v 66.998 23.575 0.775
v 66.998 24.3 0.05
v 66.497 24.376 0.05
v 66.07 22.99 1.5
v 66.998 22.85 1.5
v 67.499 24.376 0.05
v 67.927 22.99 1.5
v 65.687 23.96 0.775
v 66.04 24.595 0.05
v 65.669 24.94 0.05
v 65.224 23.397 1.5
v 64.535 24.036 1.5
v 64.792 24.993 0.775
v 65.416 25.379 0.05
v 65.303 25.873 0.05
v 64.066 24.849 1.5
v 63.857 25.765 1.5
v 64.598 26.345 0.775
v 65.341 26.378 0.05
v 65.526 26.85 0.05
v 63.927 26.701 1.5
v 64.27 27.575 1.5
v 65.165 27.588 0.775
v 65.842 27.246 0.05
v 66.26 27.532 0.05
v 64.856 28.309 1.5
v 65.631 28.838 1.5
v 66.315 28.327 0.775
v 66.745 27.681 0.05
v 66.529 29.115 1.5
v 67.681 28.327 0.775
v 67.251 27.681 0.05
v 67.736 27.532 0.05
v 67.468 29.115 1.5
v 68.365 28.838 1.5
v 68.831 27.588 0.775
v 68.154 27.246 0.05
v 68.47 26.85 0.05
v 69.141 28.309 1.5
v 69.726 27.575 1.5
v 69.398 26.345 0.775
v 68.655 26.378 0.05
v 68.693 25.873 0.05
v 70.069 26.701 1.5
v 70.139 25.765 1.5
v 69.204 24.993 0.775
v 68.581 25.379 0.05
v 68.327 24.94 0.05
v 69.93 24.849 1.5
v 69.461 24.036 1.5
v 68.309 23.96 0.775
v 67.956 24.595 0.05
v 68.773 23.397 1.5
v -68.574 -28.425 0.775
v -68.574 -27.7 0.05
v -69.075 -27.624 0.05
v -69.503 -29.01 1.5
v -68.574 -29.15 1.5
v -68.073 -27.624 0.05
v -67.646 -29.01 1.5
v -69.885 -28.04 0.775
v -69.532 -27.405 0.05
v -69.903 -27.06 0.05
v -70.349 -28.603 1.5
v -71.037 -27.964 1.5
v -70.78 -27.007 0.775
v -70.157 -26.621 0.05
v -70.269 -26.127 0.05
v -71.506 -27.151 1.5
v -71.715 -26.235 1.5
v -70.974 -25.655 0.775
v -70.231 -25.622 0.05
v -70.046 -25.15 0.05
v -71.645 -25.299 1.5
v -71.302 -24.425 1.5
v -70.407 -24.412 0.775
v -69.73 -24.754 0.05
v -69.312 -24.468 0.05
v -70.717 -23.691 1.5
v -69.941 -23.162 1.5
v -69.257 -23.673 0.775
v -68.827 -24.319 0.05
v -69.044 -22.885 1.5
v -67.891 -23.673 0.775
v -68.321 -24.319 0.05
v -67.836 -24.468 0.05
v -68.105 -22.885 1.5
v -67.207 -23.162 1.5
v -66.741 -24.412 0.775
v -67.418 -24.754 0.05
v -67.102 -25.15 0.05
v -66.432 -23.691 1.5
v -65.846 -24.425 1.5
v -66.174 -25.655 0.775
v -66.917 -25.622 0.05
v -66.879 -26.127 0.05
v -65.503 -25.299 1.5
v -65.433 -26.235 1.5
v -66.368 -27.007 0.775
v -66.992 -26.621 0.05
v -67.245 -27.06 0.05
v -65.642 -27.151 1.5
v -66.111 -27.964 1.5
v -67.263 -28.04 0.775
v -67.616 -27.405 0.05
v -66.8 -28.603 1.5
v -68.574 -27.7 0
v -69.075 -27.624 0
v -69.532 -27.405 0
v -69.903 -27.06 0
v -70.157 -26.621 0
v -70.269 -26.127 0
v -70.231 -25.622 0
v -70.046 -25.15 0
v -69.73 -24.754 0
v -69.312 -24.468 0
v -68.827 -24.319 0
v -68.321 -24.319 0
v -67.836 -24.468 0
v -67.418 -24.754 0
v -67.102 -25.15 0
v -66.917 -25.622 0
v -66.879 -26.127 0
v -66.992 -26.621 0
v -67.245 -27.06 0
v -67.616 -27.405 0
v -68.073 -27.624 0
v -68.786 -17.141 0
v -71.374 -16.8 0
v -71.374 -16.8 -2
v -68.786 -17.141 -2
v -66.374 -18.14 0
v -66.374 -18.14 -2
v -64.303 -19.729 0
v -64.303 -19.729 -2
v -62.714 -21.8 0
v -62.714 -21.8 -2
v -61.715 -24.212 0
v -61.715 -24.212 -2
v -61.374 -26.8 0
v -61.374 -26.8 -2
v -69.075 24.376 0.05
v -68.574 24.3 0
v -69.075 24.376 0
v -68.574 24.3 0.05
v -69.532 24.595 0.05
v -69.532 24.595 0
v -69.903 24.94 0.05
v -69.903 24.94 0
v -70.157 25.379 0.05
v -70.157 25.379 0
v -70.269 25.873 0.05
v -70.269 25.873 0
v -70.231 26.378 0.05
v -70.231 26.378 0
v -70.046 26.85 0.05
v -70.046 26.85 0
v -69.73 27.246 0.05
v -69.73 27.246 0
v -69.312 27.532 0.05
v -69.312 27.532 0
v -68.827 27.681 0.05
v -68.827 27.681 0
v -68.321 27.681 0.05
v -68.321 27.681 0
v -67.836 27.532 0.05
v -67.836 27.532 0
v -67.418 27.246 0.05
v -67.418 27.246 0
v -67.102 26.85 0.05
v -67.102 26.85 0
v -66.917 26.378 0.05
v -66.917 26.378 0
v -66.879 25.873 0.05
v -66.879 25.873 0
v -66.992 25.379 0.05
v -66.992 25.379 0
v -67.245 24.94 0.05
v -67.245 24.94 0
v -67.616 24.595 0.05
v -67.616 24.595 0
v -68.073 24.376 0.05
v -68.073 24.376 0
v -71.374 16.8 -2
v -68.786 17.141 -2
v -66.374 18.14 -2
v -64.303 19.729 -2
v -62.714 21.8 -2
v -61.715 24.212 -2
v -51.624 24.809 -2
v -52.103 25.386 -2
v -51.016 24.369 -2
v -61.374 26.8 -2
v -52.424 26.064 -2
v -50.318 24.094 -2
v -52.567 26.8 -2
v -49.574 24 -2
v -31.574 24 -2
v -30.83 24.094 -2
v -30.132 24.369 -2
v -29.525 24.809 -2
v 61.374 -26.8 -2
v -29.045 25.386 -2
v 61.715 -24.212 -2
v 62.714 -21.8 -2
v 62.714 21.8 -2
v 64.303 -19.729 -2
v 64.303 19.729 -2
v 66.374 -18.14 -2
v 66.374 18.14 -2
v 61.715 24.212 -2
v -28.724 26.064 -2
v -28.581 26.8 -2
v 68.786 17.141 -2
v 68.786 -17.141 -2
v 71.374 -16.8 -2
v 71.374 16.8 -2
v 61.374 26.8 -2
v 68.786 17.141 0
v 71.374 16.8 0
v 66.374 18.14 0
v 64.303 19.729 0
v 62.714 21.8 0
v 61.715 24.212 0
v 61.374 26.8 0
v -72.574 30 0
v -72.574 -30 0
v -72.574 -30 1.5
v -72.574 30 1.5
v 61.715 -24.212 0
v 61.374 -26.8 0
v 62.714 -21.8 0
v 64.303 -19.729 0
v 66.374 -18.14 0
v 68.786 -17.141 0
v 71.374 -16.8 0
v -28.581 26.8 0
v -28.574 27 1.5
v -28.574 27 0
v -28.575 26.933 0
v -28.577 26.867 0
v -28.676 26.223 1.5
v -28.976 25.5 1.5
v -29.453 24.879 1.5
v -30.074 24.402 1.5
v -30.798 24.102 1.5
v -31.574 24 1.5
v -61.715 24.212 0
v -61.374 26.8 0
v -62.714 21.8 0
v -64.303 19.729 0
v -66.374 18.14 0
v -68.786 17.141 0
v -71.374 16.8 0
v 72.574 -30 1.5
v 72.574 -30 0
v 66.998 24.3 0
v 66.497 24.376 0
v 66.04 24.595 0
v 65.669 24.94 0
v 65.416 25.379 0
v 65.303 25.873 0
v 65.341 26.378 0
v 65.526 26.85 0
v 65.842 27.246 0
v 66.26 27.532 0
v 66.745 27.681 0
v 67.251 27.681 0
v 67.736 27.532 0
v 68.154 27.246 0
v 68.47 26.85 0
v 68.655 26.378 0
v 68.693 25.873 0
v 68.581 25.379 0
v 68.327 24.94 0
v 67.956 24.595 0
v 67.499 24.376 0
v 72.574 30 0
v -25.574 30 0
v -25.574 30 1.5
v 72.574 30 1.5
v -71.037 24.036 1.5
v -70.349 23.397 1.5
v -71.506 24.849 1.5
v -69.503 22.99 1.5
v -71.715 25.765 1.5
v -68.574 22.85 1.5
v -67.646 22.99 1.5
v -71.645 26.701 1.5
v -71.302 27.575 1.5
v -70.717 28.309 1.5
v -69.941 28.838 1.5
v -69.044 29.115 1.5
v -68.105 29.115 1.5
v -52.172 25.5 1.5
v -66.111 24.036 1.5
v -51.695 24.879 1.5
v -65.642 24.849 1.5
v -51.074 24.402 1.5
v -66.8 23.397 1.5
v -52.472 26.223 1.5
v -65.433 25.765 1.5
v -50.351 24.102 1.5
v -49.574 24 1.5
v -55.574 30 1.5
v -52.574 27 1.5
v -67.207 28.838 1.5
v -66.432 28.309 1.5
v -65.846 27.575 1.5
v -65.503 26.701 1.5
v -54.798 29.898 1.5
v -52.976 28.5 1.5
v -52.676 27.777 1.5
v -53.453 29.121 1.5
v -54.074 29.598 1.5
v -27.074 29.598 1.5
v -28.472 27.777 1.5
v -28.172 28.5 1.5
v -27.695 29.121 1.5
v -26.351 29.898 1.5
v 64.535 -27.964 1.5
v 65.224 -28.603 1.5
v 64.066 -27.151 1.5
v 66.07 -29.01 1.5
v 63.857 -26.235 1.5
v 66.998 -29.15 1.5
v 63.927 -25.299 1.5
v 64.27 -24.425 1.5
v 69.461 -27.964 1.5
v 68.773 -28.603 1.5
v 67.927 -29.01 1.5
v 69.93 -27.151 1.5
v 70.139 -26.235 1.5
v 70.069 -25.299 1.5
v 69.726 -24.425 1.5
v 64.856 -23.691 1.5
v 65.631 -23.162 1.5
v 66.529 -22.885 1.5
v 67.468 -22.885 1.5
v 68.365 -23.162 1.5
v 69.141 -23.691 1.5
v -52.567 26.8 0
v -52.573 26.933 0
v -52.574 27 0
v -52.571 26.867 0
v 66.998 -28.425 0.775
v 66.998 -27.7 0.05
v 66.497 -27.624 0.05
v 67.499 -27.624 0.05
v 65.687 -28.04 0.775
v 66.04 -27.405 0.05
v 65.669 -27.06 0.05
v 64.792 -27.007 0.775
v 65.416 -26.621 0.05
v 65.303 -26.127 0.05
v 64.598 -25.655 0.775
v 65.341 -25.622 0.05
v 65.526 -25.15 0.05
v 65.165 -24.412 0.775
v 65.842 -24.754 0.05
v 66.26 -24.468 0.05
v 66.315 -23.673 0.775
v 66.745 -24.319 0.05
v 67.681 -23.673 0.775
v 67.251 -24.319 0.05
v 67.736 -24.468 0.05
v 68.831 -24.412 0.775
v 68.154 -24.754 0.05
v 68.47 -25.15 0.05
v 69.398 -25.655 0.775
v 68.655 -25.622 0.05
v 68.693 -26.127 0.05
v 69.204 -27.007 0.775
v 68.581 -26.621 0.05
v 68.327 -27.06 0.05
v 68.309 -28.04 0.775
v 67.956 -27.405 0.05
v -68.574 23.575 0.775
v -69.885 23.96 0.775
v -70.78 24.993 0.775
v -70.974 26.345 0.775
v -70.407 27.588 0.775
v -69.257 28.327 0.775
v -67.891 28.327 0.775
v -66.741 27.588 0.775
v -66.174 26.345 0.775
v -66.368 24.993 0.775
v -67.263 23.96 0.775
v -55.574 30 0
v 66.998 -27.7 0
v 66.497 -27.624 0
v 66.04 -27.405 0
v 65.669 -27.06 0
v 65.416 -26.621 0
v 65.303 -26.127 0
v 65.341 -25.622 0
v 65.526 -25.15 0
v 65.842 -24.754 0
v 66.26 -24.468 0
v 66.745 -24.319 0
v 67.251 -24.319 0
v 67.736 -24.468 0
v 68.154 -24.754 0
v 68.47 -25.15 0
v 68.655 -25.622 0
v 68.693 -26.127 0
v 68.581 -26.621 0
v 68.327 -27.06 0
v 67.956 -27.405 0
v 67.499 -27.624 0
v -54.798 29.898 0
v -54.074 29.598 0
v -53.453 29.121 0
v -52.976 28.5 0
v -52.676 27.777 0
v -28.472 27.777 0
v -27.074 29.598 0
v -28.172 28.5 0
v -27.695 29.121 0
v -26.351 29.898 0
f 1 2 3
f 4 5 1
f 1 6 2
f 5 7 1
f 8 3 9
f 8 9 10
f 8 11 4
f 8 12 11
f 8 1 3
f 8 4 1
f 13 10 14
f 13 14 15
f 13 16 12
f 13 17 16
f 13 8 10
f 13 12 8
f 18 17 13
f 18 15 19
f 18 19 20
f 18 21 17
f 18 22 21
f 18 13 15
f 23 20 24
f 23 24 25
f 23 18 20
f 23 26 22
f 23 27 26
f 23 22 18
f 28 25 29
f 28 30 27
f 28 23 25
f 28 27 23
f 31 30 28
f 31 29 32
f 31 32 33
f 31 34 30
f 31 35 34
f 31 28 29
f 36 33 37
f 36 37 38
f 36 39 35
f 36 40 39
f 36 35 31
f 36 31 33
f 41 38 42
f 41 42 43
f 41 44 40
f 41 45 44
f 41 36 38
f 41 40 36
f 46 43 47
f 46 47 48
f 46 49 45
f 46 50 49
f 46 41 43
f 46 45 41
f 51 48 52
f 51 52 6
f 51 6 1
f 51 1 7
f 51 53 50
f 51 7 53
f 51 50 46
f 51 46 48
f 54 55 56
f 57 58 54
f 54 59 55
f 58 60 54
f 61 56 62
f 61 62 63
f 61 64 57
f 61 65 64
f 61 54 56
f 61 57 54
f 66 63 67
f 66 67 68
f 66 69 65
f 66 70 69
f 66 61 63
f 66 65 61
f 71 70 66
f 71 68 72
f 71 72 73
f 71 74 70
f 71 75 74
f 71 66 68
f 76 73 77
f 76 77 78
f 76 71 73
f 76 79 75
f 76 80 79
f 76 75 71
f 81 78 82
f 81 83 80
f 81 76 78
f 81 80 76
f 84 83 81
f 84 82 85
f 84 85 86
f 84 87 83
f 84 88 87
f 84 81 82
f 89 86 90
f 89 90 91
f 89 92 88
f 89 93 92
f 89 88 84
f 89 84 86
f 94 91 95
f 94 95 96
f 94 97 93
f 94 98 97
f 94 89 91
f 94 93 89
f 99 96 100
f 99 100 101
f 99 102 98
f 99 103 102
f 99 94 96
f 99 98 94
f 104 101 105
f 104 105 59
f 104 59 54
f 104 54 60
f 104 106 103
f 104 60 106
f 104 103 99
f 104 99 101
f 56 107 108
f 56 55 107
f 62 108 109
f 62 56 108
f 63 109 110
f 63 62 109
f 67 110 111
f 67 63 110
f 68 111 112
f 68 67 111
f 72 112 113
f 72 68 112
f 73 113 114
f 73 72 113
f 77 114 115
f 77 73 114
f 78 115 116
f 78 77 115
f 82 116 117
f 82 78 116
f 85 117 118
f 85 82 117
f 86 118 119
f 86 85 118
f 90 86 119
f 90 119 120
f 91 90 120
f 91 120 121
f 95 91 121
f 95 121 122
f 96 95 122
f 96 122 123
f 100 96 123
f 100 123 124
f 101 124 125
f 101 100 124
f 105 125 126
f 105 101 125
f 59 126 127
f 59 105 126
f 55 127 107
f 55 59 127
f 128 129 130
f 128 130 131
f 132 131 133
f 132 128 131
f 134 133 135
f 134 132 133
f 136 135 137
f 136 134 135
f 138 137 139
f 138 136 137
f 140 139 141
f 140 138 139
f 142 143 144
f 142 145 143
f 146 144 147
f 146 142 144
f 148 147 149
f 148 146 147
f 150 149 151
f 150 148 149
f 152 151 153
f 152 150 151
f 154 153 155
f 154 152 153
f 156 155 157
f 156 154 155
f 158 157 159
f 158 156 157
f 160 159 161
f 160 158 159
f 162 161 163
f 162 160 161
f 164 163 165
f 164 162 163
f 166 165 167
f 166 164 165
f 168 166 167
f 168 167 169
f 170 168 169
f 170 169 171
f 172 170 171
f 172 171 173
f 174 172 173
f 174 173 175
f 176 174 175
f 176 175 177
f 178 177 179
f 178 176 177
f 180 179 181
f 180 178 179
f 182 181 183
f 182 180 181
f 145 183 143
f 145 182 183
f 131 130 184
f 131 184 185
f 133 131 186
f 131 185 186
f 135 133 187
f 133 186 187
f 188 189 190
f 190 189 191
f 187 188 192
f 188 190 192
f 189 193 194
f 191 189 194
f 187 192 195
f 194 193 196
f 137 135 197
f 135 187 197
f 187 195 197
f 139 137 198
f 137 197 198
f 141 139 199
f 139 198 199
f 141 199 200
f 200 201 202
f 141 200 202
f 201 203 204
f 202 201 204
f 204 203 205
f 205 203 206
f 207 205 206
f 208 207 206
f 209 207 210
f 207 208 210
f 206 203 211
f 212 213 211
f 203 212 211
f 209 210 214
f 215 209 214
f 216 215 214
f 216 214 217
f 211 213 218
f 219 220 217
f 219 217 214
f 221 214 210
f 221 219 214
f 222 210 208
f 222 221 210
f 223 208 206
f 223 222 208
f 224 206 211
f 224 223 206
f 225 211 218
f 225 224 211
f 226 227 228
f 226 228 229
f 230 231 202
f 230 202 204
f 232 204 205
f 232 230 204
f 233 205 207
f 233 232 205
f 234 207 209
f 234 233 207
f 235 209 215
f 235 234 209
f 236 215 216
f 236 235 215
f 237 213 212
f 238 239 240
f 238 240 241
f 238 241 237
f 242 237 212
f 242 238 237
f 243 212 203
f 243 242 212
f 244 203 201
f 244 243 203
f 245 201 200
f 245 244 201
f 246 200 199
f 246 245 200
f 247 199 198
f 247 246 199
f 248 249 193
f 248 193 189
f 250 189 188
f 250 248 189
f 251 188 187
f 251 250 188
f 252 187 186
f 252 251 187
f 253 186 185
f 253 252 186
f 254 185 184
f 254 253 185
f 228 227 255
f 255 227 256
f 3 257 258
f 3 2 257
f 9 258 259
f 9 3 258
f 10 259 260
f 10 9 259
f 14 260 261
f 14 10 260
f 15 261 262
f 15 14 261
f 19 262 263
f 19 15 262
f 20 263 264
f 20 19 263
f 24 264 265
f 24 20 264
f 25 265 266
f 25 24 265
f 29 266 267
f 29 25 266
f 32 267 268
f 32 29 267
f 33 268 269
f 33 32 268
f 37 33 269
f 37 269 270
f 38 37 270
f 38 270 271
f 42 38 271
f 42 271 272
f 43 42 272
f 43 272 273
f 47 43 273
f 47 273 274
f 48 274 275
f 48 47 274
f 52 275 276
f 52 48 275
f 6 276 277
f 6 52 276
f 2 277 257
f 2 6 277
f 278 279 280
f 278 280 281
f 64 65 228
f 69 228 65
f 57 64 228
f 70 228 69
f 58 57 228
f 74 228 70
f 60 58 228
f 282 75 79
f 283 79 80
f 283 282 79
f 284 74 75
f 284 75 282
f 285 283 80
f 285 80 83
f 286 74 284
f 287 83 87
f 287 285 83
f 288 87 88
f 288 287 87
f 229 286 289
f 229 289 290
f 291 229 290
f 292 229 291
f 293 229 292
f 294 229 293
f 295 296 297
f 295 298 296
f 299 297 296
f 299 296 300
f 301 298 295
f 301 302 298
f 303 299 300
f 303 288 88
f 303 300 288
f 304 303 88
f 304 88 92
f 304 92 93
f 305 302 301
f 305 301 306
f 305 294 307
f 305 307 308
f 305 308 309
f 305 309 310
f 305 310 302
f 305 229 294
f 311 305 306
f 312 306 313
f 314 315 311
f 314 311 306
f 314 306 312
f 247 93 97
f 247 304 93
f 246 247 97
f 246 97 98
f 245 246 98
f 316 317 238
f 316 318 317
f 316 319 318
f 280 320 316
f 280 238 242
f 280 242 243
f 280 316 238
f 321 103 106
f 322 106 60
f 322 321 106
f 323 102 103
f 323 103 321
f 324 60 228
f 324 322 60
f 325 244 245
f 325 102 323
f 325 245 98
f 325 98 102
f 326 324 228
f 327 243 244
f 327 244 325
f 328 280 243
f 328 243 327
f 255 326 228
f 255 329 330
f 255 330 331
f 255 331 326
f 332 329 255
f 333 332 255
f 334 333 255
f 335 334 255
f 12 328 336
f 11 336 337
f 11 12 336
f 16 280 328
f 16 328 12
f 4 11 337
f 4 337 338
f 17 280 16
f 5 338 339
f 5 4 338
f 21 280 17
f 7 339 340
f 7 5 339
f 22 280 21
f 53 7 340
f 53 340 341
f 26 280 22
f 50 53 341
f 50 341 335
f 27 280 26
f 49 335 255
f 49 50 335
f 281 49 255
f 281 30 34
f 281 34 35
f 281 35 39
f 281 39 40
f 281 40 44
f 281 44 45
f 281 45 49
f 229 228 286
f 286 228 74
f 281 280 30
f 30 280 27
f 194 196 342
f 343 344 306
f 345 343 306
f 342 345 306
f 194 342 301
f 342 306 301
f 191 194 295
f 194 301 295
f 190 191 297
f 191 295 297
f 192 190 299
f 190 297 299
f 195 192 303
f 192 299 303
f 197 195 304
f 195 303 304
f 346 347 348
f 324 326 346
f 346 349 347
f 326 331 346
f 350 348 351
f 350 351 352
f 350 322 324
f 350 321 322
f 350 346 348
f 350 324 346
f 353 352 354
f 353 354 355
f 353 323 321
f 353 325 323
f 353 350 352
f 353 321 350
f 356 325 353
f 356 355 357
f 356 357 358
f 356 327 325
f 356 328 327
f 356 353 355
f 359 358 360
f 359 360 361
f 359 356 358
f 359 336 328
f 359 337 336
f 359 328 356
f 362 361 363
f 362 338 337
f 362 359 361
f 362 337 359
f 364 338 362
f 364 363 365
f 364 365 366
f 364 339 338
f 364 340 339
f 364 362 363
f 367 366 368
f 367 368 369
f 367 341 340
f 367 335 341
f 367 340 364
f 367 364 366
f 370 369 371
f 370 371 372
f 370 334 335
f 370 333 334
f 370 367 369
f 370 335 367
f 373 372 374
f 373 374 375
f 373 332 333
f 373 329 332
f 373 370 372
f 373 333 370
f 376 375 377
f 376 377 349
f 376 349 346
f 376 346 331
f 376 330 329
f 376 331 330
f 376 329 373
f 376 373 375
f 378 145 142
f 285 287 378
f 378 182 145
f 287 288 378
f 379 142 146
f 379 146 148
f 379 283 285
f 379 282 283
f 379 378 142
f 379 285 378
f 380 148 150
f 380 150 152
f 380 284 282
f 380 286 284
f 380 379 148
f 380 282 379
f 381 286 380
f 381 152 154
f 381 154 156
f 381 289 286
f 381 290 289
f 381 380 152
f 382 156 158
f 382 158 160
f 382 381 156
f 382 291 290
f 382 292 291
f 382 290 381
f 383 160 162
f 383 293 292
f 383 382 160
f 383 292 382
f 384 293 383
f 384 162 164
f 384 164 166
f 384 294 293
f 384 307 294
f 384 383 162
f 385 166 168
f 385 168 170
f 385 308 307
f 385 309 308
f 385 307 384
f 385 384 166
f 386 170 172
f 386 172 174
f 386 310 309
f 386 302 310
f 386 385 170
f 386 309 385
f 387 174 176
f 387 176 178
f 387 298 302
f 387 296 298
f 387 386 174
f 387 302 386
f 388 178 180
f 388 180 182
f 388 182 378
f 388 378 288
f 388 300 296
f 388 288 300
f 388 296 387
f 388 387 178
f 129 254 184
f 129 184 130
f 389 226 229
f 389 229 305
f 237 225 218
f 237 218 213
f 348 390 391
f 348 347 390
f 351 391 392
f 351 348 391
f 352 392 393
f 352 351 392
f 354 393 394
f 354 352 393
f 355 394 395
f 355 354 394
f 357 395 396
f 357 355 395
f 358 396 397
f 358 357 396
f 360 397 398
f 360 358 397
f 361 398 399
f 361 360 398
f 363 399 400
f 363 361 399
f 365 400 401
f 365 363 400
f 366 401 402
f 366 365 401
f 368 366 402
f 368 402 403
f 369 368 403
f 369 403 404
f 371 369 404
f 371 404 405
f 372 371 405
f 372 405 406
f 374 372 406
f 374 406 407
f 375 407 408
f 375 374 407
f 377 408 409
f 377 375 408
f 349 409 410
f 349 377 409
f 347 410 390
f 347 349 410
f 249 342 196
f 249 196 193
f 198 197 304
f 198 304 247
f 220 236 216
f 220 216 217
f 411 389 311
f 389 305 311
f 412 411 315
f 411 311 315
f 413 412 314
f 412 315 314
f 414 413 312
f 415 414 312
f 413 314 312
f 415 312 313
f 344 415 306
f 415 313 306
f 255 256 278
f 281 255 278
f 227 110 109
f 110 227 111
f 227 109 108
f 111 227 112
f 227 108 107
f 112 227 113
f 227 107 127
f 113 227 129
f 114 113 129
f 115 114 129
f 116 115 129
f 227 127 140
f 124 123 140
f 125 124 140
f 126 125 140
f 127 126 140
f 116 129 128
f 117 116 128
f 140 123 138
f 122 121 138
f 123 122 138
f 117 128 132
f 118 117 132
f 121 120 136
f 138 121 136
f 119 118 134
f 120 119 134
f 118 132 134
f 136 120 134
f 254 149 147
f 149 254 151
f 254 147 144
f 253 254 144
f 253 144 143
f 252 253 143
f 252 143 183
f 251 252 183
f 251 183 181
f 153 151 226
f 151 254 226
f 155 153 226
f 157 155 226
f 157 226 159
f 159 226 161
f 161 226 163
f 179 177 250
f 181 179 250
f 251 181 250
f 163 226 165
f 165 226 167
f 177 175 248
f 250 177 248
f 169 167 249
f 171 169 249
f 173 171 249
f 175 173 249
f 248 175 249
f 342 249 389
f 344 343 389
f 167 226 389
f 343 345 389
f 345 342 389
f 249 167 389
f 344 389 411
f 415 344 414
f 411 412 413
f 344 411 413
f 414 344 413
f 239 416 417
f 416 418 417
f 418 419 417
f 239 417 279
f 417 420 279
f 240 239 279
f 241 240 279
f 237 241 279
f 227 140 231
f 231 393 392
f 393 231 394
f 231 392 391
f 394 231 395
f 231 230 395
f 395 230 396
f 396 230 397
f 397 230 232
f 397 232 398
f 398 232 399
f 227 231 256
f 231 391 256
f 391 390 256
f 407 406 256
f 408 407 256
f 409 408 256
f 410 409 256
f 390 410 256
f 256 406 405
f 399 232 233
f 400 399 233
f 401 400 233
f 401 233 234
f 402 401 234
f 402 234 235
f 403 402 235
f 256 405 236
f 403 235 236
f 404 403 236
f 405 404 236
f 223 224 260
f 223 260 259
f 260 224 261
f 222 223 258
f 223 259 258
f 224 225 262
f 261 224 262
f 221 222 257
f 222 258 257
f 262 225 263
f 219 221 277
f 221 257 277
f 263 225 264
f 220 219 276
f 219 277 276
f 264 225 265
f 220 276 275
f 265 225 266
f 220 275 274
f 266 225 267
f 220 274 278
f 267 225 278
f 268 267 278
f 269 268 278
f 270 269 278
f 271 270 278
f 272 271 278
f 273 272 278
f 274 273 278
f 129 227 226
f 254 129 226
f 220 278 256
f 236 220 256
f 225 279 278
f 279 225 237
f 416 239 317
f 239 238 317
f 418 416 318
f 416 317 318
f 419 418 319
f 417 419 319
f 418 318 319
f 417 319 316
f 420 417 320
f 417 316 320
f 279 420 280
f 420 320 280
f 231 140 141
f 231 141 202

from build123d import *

# Parameters (mm, degrees)
ESQUISSE1_W                                 = 145.148196
ESQUISSE1_H                                 = 60
BOSS_EXTRU_1_DEPTH                          = 1.5
BOSS_EXTRU_2_DEPTH                          = 2
FRAISAGE_POUR_VIS_T_TE_FRAIS_E_M31_AT_COUNT = 2
FRAISAGE_POUR_VIS_T_TE_FRAIS_E_M31_AT_PITCH = 52
FRAISAGE_POUR_VIS_T_TE_FRAIS_E_M31_2_COUNT  = 2
FRAISAGE_POUR_VIS_T_TE_FRAIS_E_M31_2_PITCH  = 135.572178
FRAISAGE_POUR_VIS_T_TE_FRAIS_E_M31_3_COUNT  = 2
FRAISAGE_POUR_VIS_T_TE_FRAIS_E_M31_3_PITCH  = 145.20267025
ENL_V_MAT_EXTRU_1_DEPTH                     = 79.608203774
ENL_V_MAT_EXTRU_1_DEPTH_BACK                = 79.608203774
ESQUISSE6_W                                 = 24
ESQUISSE6_H                                 = 6
CONG_1_R                                    = 3


with BuildPart() as part:
    # Esquisse1 → Boss.-Extru.1 (new body)
    with BuildSketch(Plane.XY):
        Rectangle(ESQUISSE1_W, ESQUISSE1_H)
    extrude(amount=BOSS_EXTRU_1_DEPTH)

    # Esquisse2 → Boss.-Extru.2 (add)
    with BuildSketch(Plane(origin=(0, 0, 0), x_dir=(-1, 0, 0), z_dir=(0, 0, -1))):
        with BuildLine():
            Line((-71.374098, -16.8), (-71.374098, 16.8))
            ThreePointArc((-71.374098, 16.8), (-64.303030188, 19.728932188), (-61.374098, 26.8))
            Line((-61.374098, 26.8), (61.374098, 26.8))
            ThreePointArc((61.374098, 26.8), (64.303030188, 19.728932188), (71.374098, 16.8))
            Line((71.374098, 16.8), (71.374098, -16.8))
            ThreePointArc((71.374098, -16.8), (64.303030188, -19.728932188), (61.374098, -26.8))
            Line((61.374098, -26.8), (-61.374098, -26.8))
            ThreePointArc((-61.374098, -26.8), (-64.303030188, -19.728932188), (-71.374098, -16.8))
        make_face()
    extrude(amount=BOSS_EXTRU_2_DEPTH)

    # Esquisse5 → Fraisage pour vis à tête fraisée M31 (revolve, cut)
    with BuildSketch(Plane(origin=(-68.574098, 26, 1.5), x_dir=(0, -1, 0), z_dir=(1, 0, 0))):
        Polygon((0, 0), (0, 1.5), (1.7, 1.5), (1.7, 1.45), (3.15, 0), align=None)
    fraisage_pour_vis_t_te_frais_e_m31 = revolve(axis=Axis((-68.574098, 26, 7.85), (0, 0, -1)), mode=Mode.SUBTRACT)

    # Fraisage pour vis à tête fraisée M31 at: Fraisage pour vis à tête fraisée M31 ×2
    with Locations(*[(0, -i * FRAISAGE_POUR_VIS_T_TE_FRAIS_E_M31_AT_PITCH, 0) for i in range(1, FRAISAGE_POUR_VIS_T_TE_FRAIS_E_M31_AT_COUNT)]):
        add(fraisage_pour_vis_t_te_frais_e_m31, mode=Mode.SUBTRACT)

    # Fraisage pour vis _ t_te frais_e M31 2: Fraisage pour vis à tête fraisée M31 ×2
    with Locations(*[(i * FRAISAGE_POUR_VIS_T_TE_FRAIS_E_M31_2_PITCH, 0, 0) for i in range(1, FRAISAGE_POUR_VIS_T_TE_FRAIS_E_M31_2_COUNT)]):
        add(fraisage_pour_vis_t_te_frais_e_m31, mode=Mode.SUBTRACT)

    # Fraisage pour vis _ t_te frais_e M31 3: Fraisage pour vis à tête fraisée M31 ×2
    with Locations(*[Vector(0.9336755155176905, -0.35812013588009123, 0) * (i * FRAISAGE_POUR_VIS_T_TE_FRAIS_E_M31_3_PITCH) for i in range(1, FRAISAGE_POUR_VIS_T_TE_FRAIS_E_M31_3_COUNT)]):
        add(fraisage_pour_vis_t_te_frais_e_m31, mode=Mode.SUBTRACT)

    # Esquisse6 → Enlèv. mat.-Extru.1 (cut, two sides: drawn at the far end of the back side and taken through both)
    with BuildSketch(Plane.XY.offset(1.5).offset(-ENL_V_MAT_EXTRU_1_DEPTH_BACK)):
        with Locations((-40.574098, 27)):
            Rectangle(ESQUISSE6_W, ESQUISSE6_H)
    extrude(amount=ENL_V_MAT_EXTRU_1_DEPTH + ENL_V_MAT_EXTRU_1_DEPTH_BACK, mode=Mode.SUBTRACT)

    # Congé1
    cong_1_edges = [part.edges().sort_by_distance(p)[0] for p in [
        (-28.574098, 30, 0.75),
        (-28.574098, 24, -0.25),
        (-52.574098, 30, 0.75),
        (-52.574098, 24, -0.25),
    ]]
    fillet(cong_1_edges, radius=CONG_1_R - 0.0001)  # a hair under: the kernel refuses the full size


solid = part.part
